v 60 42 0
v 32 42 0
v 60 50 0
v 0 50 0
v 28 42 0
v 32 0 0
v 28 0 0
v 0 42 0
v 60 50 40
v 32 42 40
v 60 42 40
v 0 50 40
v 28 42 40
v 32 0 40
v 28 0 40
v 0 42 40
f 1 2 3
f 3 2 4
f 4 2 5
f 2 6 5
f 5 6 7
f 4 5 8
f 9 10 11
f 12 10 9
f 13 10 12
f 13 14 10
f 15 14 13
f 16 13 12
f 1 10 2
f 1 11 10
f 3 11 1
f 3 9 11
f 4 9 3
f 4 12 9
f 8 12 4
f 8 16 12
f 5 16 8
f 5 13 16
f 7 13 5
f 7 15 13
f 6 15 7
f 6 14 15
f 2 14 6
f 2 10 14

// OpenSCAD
$fn = 32;

// ----------------------------------------------------------------------
// Structural section: tee 60 x 50 mm
// ----------------------------------------------------------------------

// --- parameters (mm) ---
sec_w = 60;               // tee width, X
sec_h = 50;               // tee height, Y
flange_t = 8;             // top flange thickness
web_t = 4;                // web thickness
plate_t = 40;             // cut length, Z (extrusion height)
fit_tol = 0.1;            // declared fit tolerance (prompt contract)
free_tol = 0.3;           // declared free tolerance (prompt contract)

profile = [[28, 0], [32, 0], [32, 42], [60, 42], [60, 50], [0, 50], [0, 42], [28, 42]];  // primary outline, 8 points, counter clockwise

// --- the one profile operation ---
linear_extrude(height = plate_t) polygon(points = profile);
